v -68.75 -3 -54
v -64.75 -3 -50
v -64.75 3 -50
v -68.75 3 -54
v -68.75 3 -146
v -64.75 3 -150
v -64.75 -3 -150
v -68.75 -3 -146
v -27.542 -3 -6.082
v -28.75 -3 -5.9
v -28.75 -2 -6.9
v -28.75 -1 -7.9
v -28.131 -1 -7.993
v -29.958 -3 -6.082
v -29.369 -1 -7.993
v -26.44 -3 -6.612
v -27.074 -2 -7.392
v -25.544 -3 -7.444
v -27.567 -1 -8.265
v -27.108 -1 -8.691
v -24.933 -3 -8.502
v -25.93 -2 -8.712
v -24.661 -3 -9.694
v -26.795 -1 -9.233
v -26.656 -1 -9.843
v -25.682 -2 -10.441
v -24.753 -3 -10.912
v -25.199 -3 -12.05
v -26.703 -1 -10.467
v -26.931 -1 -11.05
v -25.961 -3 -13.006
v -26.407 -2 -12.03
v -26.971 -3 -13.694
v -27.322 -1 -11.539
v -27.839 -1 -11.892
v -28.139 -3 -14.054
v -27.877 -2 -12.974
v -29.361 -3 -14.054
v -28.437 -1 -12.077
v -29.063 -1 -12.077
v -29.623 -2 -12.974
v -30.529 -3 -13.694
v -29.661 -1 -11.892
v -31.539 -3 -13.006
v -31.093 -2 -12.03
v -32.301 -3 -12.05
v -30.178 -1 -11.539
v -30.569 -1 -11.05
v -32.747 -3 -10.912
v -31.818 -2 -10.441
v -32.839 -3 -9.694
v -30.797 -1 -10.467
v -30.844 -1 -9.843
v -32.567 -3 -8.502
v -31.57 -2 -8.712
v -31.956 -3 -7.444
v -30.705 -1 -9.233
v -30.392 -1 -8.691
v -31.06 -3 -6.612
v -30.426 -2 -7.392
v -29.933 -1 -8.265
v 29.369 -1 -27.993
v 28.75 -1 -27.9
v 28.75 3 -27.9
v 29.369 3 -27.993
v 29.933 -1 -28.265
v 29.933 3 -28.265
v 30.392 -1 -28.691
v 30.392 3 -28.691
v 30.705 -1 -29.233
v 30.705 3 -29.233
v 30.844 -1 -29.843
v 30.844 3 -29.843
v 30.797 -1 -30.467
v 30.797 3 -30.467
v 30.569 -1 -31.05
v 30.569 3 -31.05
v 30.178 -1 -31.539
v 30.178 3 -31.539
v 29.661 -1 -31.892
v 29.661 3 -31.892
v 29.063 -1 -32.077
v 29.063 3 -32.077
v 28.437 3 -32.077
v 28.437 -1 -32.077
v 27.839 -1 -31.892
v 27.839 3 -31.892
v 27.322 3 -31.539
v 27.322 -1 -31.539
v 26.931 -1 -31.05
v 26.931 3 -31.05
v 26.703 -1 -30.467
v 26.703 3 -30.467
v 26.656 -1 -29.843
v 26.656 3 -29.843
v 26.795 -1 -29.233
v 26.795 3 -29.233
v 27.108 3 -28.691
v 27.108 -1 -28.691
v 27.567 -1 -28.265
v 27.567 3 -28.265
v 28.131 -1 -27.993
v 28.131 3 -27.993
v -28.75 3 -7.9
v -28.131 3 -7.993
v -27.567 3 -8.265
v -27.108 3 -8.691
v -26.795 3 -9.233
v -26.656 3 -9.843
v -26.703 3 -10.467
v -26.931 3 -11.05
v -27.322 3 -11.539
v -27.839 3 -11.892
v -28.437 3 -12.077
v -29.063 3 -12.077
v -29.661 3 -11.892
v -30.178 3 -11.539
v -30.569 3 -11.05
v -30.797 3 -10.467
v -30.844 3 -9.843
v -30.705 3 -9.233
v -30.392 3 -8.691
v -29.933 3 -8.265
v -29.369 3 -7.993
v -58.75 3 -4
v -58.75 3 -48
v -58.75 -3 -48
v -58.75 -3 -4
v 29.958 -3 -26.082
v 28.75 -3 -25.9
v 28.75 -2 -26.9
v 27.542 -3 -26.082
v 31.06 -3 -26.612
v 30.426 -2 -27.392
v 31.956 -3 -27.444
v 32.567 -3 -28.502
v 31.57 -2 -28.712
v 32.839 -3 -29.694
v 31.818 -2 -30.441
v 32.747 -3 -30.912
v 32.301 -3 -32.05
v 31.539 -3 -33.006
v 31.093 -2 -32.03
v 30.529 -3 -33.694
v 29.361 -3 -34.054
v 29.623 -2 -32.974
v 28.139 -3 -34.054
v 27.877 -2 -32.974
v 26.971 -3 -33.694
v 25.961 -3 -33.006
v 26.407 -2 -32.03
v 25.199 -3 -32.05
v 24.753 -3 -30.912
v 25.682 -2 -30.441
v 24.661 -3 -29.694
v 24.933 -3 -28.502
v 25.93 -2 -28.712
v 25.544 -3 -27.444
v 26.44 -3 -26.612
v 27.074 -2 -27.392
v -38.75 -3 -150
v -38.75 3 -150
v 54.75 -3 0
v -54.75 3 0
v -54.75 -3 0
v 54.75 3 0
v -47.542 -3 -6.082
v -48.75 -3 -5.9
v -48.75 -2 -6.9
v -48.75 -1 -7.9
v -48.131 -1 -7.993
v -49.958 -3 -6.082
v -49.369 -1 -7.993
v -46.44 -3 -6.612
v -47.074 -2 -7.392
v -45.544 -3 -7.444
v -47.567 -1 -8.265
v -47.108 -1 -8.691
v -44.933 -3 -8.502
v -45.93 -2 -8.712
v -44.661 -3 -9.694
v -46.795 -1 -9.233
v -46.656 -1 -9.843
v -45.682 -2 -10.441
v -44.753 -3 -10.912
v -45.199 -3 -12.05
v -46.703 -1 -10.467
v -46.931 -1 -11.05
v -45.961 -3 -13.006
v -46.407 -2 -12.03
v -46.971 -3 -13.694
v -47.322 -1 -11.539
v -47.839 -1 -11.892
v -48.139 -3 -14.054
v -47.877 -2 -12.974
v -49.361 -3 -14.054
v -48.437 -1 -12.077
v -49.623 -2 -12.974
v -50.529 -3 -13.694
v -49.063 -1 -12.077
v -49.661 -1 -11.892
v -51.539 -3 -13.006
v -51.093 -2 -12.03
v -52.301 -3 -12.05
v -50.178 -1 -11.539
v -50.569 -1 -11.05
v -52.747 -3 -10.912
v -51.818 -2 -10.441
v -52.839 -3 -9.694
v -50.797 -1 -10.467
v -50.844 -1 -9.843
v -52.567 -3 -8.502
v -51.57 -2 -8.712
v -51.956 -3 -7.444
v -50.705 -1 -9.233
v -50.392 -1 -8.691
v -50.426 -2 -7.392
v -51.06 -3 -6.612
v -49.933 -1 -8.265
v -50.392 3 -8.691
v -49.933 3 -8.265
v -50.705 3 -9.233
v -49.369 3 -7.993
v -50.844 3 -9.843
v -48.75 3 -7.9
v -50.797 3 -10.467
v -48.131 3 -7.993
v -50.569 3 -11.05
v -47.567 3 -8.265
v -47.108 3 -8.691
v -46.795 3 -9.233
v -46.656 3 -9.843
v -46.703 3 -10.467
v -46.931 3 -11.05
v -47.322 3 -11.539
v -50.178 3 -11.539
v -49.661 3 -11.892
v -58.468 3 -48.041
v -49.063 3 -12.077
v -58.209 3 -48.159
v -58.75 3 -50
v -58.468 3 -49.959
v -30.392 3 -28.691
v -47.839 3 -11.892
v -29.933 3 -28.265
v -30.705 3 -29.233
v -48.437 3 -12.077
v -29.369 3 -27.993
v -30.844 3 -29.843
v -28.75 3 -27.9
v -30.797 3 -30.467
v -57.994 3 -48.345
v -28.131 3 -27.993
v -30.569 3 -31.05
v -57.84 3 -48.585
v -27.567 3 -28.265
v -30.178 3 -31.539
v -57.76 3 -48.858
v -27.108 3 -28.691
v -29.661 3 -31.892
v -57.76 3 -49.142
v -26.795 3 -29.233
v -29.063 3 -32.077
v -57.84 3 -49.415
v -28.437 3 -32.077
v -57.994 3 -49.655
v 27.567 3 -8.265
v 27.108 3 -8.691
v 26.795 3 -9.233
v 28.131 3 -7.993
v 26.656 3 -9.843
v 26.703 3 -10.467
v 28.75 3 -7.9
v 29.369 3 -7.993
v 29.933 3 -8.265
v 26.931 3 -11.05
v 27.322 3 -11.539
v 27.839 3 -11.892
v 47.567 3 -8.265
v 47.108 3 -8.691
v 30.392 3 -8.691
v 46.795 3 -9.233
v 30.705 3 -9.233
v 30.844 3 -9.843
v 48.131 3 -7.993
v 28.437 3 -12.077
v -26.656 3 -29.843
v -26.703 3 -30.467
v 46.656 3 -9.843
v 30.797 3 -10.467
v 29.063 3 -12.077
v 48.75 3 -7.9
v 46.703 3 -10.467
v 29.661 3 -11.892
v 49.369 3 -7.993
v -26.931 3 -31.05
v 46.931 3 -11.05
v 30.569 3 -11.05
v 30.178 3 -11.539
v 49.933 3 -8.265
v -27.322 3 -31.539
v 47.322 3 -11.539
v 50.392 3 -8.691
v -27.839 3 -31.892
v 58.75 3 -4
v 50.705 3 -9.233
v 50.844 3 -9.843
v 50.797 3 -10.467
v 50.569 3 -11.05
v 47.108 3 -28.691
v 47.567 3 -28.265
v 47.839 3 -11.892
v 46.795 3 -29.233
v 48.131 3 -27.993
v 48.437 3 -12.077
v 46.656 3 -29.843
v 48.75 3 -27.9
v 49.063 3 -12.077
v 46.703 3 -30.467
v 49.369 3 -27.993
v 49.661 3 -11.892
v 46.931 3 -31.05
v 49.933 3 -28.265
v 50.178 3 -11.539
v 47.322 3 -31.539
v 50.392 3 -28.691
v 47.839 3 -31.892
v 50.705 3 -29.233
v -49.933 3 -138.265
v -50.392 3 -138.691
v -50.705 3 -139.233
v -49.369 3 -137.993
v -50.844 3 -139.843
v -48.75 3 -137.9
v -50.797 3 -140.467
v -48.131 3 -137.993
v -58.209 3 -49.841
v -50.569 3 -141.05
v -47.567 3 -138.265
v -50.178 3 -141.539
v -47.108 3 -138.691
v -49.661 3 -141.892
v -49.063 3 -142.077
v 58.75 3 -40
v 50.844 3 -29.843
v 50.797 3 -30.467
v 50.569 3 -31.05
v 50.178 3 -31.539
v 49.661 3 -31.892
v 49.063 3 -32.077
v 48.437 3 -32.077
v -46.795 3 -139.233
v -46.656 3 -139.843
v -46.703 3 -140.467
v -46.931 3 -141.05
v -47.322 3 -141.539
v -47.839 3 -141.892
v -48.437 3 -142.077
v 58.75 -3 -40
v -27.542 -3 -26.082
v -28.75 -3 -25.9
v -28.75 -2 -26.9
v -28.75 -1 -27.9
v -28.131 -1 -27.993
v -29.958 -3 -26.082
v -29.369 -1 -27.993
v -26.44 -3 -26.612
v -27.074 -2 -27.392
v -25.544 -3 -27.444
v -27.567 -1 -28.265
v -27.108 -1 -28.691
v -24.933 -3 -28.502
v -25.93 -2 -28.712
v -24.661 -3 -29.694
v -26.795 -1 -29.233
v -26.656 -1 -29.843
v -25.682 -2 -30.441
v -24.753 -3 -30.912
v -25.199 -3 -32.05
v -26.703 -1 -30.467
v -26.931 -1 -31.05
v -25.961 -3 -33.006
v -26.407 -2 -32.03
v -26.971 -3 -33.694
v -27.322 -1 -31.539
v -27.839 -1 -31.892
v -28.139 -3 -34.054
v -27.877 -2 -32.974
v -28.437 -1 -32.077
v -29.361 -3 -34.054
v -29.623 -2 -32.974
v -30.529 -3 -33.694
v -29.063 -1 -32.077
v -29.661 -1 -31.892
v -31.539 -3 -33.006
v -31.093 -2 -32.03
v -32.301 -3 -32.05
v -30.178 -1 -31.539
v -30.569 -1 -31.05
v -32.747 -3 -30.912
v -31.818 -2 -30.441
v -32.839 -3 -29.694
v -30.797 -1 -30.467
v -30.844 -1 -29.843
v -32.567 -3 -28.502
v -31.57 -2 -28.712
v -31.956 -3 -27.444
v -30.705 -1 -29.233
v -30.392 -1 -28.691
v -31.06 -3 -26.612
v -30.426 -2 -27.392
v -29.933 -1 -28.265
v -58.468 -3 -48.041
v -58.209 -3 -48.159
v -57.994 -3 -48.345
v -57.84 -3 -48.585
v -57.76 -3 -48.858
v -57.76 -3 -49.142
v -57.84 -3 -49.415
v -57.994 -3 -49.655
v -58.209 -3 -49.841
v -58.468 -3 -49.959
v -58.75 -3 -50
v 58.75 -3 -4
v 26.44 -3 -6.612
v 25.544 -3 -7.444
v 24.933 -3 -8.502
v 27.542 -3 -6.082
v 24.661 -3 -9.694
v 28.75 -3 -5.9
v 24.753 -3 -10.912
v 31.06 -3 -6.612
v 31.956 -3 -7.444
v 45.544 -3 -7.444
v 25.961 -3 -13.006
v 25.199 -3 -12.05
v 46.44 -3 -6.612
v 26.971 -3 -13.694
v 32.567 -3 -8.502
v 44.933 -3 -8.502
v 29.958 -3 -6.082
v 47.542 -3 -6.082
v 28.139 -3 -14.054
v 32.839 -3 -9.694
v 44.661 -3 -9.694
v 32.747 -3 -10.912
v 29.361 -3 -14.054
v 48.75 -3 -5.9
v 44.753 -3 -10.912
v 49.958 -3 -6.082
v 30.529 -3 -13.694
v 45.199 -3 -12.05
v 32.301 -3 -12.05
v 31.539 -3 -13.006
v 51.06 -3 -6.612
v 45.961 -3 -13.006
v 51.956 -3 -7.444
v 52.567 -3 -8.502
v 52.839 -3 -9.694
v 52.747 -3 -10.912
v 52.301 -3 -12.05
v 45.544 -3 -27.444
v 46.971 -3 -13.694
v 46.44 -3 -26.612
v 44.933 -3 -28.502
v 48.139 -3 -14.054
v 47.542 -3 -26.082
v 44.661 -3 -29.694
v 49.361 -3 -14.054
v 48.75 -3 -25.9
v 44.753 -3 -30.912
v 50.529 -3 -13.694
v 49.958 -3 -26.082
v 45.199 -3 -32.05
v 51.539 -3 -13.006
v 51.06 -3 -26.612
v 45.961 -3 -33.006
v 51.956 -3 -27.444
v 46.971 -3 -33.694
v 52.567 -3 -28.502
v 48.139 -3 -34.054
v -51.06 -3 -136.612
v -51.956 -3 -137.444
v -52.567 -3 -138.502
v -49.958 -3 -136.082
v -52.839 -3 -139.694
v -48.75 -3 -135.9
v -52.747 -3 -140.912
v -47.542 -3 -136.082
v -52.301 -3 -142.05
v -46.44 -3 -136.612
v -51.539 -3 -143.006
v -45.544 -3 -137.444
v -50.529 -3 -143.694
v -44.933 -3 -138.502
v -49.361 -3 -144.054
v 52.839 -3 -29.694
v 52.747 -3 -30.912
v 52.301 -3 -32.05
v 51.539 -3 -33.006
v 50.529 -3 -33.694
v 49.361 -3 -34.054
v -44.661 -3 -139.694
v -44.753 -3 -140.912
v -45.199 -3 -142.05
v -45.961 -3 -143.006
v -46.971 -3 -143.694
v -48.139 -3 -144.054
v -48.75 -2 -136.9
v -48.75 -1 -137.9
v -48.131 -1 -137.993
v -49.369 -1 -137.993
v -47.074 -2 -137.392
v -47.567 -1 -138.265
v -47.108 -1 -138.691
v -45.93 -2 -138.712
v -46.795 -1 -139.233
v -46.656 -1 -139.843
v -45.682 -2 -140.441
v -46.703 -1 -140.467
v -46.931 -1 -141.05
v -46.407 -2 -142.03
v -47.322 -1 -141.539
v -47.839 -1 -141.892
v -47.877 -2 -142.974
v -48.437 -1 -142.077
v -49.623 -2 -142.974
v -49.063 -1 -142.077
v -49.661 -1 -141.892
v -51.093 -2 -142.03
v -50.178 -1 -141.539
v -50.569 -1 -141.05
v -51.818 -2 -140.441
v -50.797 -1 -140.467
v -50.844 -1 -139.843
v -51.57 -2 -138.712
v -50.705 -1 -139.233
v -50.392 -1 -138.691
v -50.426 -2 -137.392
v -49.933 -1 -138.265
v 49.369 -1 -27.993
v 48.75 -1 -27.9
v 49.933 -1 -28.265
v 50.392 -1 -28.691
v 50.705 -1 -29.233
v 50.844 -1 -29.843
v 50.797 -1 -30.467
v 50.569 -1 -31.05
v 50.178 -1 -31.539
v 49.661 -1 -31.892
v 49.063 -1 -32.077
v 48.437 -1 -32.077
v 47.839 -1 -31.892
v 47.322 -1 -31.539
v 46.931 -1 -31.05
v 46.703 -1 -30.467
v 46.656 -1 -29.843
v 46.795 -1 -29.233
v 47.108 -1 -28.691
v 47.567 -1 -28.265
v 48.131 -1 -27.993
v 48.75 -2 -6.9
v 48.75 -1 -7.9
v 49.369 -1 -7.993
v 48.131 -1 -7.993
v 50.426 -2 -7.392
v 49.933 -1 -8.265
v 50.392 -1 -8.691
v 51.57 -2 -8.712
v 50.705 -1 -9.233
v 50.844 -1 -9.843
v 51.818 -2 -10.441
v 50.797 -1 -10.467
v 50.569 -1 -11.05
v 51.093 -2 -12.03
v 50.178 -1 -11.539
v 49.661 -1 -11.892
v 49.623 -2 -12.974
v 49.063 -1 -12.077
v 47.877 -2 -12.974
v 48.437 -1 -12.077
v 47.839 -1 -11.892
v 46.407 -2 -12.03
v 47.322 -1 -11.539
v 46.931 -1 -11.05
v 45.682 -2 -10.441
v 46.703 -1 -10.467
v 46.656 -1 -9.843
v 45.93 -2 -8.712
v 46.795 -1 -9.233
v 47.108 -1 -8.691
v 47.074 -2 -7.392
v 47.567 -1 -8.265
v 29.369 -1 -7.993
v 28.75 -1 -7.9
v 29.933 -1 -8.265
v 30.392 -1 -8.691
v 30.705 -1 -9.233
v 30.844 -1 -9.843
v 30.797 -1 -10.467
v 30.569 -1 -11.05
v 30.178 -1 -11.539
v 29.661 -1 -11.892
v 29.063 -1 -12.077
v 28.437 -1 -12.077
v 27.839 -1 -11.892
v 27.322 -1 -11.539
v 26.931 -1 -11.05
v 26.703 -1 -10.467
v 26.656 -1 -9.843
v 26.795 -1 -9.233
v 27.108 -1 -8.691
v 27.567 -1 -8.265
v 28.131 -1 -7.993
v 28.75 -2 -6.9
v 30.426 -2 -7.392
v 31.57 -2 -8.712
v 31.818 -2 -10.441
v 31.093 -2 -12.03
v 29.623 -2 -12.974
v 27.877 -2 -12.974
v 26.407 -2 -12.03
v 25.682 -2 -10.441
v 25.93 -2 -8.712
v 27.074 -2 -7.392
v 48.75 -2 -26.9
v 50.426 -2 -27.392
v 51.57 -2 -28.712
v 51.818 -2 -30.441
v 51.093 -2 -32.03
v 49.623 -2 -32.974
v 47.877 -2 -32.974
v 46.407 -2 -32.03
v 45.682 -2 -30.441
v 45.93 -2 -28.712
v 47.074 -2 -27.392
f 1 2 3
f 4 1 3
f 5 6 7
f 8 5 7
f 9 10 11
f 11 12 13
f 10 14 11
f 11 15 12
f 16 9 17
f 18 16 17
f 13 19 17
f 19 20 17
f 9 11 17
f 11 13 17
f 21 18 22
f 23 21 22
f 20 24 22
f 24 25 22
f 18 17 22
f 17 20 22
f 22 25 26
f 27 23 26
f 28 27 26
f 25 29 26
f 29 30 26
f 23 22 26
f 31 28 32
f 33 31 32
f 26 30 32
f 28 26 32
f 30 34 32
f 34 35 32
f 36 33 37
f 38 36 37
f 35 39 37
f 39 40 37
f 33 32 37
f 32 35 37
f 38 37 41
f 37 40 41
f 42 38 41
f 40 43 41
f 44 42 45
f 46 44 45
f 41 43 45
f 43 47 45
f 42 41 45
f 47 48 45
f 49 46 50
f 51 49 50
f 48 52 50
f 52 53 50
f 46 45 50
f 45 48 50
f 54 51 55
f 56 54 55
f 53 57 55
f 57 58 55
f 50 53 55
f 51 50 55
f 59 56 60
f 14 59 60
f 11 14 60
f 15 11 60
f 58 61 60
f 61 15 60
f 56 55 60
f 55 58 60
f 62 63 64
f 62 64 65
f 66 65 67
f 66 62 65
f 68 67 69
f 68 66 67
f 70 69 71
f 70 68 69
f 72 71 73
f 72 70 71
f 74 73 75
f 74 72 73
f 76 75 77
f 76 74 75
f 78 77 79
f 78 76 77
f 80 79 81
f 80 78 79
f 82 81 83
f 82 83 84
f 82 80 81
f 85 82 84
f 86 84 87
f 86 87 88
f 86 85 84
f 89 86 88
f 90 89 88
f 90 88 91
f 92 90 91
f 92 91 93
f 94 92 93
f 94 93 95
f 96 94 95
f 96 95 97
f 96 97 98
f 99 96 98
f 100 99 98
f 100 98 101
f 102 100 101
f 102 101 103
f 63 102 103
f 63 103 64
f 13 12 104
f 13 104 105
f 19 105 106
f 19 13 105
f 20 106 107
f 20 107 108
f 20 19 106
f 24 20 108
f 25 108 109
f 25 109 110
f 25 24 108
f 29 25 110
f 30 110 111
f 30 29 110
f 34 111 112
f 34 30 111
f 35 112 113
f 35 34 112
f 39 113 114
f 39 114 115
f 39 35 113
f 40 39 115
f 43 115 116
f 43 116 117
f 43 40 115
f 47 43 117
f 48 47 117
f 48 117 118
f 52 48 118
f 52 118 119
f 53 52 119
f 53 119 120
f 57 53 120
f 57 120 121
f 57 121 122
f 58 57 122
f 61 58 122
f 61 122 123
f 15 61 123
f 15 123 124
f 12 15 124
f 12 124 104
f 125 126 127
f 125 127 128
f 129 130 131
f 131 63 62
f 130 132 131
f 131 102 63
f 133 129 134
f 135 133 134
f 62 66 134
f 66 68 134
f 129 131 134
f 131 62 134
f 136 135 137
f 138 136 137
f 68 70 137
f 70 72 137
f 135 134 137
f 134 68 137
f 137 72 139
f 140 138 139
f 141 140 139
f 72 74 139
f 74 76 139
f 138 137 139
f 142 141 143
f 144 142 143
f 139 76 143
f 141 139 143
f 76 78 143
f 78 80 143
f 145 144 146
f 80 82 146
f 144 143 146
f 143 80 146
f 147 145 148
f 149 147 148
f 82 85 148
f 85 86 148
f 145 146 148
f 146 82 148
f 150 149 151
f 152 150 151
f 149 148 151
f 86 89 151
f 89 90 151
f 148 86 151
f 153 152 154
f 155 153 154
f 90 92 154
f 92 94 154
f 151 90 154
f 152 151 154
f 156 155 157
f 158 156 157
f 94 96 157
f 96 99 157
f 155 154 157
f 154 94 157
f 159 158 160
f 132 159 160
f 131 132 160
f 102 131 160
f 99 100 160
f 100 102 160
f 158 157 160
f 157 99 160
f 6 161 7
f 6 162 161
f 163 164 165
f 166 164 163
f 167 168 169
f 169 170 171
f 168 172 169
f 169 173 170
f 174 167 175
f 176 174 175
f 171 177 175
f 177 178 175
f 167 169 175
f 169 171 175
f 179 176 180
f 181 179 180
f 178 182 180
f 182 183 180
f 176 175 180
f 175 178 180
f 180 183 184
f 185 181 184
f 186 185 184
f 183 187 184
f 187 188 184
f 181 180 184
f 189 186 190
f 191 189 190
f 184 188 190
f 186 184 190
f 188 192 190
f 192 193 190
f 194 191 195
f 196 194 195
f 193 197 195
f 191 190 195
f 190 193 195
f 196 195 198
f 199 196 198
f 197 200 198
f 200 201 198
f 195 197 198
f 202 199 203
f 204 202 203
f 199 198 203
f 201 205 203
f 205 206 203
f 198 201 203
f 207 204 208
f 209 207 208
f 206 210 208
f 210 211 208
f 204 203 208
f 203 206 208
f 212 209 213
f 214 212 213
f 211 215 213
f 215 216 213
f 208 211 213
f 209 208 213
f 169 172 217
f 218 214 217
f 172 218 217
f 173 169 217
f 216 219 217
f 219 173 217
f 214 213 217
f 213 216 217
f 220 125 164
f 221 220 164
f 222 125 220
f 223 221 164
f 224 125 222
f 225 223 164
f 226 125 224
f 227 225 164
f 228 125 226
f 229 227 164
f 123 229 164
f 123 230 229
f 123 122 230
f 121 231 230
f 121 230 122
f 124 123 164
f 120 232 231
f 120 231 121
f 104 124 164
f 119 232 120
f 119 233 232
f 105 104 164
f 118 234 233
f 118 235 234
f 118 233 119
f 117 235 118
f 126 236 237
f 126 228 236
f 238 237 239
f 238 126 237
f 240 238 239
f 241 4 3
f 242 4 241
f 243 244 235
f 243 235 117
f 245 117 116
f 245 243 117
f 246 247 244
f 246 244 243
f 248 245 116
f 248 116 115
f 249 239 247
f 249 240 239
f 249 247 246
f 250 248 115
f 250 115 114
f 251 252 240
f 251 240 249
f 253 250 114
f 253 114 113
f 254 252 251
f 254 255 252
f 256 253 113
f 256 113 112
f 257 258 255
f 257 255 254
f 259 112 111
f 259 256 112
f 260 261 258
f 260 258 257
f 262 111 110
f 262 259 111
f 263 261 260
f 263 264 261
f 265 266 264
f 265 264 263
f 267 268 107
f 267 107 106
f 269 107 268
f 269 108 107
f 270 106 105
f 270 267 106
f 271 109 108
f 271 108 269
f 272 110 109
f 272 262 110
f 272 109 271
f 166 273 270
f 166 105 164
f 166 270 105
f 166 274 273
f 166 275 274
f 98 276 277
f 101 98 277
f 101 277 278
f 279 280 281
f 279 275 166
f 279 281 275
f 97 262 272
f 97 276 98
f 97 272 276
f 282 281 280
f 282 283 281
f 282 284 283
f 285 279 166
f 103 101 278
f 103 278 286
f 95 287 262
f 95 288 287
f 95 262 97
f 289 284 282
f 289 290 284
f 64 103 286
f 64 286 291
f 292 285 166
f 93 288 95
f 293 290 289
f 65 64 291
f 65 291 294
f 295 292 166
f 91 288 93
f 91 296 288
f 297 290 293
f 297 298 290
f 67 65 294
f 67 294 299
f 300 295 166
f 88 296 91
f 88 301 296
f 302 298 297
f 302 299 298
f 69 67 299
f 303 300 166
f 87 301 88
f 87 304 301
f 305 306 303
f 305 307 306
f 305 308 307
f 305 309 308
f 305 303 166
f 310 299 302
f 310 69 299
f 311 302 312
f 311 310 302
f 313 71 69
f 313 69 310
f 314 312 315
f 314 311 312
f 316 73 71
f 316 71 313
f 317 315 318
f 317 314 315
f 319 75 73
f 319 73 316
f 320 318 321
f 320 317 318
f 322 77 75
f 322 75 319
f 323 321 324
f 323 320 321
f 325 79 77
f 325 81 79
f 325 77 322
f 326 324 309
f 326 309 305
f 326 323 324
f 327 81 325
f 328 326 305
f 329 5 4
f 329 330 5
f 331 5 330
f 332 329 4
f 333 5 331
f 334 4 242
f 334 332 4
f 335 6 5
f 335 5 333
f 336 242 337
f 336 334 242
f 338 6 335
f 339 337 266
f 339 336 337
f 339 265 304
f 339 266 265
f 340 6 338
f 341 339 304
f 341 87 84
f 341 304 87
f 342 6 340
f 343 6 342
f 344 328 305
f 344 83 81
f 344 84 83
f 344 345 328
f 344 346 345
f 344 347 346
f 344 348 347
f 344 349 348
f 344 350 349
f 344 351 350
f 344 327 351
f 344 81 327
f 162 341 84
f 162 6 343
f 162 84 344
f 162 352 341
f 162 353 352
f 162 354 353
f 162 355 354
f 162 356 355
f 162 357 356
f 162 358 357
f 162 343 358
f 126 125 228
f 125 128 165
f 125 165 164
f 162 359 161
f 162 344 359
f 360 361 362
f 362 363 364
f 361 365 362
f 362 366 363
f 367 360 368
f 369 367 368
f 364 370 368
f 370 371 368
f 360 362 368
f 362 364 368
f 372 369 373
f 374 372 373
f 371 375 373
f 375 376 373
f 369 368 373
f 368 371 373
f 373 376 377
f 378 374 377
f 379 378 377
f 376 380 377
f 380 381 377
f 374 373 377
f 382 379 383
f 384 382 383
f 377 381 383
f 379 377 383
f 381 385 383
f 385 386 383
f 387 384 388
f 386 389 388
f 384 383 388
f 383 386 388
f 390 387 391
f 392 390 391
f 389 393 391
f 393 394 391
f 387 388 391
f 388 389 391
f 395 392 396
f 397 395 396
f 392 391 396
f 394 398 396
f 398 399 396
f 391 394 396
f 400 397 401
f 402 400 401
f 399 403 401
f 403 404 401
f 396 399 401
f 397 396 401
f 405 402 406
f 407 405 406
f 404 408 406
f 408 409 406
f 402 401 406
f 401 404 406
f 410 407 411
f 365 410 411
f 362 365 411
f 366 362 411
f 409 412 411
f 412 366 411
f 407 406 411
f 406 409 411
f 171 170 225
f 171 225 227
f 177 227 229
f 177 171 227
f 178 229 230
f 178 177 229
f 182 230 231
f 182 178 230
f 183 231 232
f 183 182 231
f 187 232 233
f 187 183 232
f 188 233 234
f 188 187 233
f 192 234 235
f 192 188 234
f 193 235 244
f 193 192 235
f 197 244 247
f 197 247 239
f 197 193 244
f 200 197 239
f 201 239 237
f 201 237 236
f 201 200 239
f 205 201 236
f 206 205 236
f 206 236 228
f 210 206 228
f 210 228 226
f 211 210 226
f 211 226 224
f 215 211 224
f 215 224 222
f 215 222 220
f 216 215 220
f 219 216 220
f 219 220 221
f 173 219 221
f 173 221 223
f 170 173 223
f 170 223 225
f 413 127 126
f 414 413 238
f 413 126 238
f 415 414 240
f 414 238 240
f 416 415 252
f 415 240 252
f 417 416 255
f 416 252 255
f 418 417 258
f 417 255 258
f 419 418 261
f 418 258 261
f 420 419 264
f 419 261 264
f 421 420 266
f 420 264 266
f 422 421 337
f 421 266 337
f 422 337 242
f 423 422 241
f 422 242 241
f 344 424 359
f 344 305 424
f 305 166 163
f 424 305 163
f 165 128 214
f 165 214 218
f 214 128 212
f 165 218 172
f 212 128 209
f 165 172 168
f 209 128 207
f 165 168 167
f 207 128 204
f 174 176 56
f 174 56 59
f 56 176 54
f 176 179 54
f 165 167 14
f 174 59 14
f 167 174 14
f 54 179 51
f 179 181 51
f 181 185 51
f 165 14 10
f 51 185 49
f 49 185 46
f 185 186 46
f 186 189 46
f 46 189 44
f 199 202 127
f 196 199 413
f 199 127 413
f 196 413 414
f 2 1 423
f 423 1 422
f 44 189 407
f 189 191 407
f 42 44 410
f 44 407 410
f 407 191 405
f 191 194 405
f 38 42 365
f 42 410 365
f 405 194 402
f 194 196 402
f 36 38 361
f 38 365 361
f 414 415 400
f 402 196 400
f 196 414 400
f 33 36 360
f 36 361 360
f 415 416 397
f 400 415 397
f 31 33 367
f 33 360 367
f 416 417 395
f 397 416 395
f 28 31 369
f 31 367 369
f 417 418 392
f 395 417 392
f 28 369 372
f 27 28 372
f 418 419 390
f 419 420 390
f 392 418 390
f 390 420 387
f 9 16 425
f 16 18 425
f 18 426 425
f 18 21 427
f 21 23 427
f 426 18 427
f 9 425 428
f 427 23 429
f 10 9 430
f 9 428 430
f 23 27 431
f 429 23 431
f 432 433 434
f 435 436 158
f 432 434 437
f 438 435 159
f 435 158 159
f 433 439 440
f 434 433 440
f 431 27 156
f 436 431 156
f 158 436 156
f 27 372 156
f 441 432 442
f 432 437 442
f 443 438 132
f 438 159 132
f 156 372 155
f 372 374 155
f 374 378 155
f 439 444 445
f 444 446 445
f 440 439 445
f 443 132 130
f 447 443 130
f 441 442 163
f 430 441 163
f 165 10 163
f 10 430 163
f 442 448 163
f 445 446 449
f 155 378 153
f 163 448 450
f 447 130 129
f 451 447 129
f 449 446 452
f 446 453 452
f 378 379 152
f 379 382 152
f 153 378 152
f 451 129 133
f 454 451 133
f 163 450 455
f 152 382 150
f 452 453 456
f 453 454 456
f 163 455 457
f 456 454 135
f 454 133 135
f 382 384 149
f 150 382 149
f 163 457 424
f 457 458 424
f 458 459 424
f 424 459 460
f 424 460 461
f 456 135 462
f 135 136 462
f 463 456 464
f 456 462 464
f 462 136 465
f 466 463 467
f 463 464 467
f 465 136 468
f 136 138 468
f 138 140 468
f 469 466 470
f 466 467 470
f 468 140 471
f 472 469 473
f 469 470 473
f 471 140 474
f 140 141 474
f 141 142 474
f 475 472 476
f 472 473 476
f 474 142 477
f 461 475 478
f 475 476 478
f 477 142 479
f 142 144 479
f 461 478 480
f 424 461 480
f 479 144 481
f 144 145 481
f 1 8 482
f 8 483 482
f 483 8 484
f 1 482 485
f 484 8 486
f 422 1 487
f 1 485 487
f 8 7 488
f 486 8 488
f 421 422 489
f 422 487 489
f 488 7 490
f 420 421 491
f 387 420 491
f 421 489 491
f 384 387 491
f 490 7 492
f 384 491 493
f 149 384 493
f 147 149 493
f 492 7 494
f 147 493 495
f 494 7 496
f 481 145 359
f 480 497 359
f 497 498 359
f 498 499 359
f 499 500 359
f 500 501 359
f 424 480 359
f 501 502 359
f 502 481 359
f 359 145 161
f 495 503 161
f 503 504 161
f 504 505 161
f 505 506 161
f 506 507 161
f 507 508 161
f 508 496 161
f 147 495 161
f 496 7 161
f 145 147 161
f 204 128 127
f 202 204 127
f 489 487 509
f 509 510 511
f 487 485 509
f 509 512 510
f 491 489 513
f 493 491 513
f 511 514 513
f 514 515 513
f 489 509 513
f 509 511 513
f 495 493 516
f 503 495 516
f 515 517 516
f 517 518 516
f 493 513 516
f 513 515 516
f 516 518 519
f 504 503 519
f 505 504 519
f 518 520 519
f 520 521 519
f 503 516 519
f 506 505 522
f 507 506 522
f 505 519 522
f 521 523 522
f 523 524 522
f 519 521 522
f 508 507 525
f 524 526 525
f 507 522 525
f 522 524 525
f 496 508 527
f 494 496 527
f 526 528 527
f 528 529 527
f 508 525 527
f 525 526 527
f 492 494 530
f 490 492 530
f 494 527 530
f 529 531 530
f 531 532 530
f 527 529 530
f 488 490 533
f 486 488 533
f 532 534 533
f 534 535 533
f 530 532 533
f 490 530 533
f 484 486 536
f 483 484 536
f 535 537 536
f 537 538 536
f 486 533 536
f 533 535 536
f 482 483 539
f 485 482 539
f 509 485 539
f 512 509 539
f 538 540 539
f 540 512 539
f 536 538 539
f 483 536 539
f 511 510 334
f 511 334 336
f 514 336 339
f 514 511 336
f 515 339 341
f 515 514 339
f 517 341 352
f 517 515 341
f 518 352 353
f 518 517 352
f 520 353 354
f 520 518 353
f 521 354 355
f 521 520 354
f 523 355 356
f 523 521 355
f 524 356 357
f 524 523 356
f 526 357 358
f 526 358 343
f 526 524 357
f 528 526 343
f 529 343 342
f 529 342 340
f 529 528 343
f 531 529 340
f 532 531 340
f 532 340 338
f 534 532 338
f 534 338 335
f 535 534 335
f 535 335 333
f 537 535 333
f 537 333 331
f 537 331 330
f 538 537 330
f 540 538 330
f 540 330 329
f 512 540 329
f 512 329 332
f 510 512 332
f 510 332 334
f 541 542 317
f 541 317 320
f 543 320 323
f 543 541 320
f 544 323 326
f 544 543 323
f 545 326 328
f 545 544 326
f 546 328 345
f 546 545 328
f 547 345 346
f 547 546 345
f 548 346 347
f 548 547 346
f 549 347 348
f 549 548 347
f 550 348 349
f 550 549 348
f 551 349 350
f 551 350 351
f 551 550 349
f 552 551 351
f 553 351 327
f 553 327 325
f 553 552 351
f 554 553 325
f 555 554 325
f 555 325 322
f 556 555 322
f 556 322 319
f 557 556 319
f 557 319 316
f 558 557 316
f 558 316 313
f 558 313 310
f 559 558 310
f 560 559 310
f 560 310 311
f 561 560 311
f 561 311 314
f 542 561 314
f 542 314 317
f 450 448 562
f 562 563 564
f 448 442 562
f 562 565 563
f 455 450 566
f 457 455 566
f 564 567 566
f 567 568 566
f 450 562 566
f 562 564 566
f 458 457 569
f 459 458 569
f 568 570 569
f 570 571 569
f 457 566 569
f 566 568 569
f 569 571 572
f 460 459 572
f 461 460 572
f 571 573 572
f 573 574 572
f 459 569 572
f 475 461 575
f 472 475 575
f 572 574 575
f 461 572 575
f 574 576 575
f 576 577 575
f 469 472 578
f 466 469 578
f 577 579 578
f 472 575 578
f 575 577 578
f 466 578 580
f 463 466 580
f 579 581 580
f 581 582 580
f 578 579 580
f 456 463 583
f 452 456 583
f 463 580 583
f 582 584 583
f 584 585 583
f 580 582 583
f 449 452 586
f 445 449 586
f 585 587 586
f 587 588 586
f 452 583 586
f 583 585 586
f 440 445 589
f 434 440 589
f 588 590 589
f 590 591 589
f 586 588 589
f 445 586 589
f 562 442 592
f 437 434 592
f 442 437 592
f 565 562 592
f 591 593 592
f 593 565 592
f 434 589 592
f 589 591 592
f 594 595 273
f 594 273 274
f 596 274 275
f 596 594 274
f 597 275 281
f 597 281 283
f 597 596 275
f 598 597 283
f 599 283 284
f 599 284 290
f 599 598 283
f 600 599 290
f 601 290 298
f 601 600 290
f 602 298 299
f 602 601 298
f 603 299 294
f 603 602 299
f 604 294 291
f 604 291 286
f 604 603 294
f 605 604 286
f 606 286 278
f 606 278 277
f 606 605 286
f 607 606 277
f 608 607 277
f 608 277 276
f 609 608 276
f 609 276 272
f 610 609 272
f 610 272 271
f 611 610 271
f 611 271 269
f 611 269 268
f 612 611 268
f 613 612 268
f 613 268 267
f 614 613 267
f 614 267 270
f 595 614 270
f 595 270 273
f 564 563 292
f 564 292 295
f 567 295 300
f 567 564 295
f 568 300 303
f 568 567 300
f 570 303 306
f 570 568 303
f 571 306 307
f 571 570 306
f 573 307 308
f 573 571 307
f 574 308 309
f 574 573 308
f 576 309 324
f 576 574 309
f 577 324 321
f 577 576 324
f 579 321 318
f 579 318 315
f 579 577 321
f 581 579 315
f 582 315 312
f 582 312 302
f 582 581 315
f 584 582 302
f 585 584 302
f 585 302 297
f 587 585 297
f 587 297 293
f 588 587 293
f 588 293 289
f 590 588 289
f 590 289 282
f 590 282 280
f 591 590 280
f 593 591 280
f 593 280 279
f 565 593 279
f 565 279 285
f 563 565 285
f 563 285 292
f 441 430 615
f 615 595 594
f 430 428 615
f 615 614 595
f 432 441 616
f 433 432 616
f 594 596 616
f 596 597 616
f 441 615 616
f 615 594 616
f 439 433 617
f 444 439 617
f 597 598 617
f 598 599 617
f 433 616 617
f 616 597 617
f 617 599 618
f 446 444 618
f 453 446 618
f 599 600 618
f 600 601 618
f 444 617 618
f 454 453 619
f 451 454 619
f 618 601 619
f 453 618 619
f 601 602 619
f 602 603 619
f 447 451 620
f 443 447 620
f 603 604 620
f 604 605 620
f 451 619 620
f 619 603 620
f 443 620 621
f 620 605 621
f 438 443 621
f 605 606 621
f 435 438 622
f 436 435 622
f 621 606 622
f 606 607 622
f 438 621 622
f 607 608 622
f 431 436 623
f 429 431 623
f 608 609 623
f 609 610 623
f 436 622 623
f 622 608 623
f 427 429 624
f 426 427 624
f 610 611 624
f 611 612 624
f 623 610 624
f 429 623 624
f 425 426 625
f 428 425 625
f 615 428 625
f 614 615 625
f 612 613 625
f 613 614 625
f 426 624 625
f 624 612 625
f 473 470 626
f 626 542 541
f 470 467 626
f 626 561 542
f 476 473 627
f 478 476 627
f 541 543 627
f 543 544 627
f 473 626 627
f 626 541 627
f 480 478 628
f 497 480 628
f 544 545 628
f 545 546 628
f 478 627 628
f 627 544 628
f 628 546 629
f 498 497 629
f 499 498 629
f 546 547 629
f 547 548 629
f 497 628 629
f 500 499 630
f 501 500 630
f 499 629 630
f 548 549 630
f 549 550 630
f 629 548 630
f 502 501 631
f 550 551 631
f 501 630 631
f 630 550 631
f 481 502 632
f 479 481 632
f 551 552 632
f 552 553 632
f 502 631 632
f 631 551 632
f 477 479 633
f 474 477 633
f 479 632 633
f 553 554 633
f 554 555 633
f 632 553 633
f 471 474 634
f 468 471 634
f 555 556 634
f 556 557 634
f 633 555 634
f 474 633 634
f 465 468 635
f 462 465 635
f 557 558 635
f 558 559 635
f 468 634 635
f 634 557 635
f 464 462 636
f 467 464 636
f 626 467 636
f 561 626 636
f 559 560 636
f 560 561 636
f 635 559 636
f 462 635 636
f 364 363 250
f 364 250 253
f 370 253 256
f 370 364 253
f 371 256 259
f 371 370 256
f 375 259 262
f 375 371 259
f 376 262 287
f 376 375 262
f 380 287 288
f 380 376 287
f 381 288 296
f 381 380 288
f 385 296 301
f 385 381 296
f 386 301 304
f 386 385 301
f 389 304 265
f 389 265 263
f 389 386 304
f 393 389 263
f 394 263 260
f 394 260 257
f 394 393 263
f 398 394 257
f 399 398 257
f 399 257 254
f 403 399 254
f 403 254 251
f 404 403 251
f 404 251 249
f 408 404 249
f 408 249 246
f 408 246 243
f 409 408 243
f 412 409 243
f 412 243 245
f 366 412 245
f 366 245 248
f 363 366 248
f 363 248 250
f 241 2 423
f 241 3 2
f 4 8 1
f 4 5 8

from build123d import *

# Parameters (mm, degrees)
SKETCH_1_R          = 2.1
EXTRUDE_1_DEPTH     = 3
SKETCH_2_R          = 1
CUT_EXTRUDE_1_DEPTH = 166.113786523
CHAMFER_1_SIZE      = 4
CHAMFER_2_SIZE      = 2


with BuildPart() as part:
    # 草图1 → 凸台-拉伸1 (new, symmetric)
    with BuildSketch(Plane(origin=(0, 0, 0), x_dir=(1, 0, 0), z_dir=(0, 1, 0))):
        Polygon((-68.75, 150), (-68.75, 50), (-58.75, 50), (-58.75, 0), (58.75, 0), (58.75, 40), (-38.75, 150), align=None)
        with Locations(Location((-48.75, 140, 0), (0, 0, 270))):
            Circle(SKETCH_1_R, mode=Mode.SUBTRACT)
        with Locations(Location((-48.75, 10, 0), (0, 0, 270))):
            Circle(SKETCH_1_R, mode=Mode.SUBTRACT)
        with Locations(Location((-28.75, 30, 0), (0, 0, 270))):
            Circle(SKETCH_1_R, mode=Mode.SUBTRACT)
        with Locations(Location((28.75, 30, 0), (0, 0, 270))):
            Circle(SKETCH_1_R, mode=Mode.SUBTRACT)
        with Locations(Location((-28.75, 10, 0), (0, 0, 270))):
            Circle(SKETCH_1_R, mode=Mode.SUBTRACT)
        with Locations(Location((28.75, 10, 0), (0, 0, 270))):
            Circle(SKETCH_1_R, mode=Mode.SUBTRACT)
        with Locations(Location((48.75, 30, 0), (0, 0, 270))):
            Circle(SKETCH_1_R, mode=Mode.SUBTRACT)
        with Locations(Location((48.75, 10, 0), (0, 0, 270))):
            Circle(SKETCH_1_R, mode=Mode.SUBTRACT)
    extrude(amount=EXTRUDE_1_DEPTH, both=True)

    # 草图2 → 切除-拉伸1 (cut, through all)
    with BuildSketch(Plane(origin=(0, 3, 0), x_dir=(1, 0, 0), z_dir=(0, 1, 0))):
        with Locations((-58.75, 49)):
            Circle(SKETCH_2_R)
    extrude(amount=-CUT_EXTRUDE_1_DEPTH, mode=Mode.SUBTRACT)

    # 倒角1
    chamfer_1_edges = [part.edges().sort_by_distance(p)[0] for p in [
        (58.75, 0, 0),
        (-58.75, 0, 0),
        (-68.75, 0, -50),
        (-68.75, 0, -150),
    ]]
    chamfer(chamfer_1_edges, length=CHAMFER_1_SIZE)

    # 倒角2
    chamfer_2_edges = [part.edges().sort_by_distance(p)[0] for p in [
        (-48.75, -3, -142.1),
        (-28.75, -3, -32.1),
        (-48.75, -3, -12.1),
        (28.75, -3, -32.1),
        (-28.75, -3, -12.1),
        (28.75, -3, -12.1),
        (48.75, -3, -12.1),
        (48.75, -3, -32.1),
    ]]
    chamfer(chamfer_2_edges, length=CHAMFER_2_SIZE)


solid = part.part
